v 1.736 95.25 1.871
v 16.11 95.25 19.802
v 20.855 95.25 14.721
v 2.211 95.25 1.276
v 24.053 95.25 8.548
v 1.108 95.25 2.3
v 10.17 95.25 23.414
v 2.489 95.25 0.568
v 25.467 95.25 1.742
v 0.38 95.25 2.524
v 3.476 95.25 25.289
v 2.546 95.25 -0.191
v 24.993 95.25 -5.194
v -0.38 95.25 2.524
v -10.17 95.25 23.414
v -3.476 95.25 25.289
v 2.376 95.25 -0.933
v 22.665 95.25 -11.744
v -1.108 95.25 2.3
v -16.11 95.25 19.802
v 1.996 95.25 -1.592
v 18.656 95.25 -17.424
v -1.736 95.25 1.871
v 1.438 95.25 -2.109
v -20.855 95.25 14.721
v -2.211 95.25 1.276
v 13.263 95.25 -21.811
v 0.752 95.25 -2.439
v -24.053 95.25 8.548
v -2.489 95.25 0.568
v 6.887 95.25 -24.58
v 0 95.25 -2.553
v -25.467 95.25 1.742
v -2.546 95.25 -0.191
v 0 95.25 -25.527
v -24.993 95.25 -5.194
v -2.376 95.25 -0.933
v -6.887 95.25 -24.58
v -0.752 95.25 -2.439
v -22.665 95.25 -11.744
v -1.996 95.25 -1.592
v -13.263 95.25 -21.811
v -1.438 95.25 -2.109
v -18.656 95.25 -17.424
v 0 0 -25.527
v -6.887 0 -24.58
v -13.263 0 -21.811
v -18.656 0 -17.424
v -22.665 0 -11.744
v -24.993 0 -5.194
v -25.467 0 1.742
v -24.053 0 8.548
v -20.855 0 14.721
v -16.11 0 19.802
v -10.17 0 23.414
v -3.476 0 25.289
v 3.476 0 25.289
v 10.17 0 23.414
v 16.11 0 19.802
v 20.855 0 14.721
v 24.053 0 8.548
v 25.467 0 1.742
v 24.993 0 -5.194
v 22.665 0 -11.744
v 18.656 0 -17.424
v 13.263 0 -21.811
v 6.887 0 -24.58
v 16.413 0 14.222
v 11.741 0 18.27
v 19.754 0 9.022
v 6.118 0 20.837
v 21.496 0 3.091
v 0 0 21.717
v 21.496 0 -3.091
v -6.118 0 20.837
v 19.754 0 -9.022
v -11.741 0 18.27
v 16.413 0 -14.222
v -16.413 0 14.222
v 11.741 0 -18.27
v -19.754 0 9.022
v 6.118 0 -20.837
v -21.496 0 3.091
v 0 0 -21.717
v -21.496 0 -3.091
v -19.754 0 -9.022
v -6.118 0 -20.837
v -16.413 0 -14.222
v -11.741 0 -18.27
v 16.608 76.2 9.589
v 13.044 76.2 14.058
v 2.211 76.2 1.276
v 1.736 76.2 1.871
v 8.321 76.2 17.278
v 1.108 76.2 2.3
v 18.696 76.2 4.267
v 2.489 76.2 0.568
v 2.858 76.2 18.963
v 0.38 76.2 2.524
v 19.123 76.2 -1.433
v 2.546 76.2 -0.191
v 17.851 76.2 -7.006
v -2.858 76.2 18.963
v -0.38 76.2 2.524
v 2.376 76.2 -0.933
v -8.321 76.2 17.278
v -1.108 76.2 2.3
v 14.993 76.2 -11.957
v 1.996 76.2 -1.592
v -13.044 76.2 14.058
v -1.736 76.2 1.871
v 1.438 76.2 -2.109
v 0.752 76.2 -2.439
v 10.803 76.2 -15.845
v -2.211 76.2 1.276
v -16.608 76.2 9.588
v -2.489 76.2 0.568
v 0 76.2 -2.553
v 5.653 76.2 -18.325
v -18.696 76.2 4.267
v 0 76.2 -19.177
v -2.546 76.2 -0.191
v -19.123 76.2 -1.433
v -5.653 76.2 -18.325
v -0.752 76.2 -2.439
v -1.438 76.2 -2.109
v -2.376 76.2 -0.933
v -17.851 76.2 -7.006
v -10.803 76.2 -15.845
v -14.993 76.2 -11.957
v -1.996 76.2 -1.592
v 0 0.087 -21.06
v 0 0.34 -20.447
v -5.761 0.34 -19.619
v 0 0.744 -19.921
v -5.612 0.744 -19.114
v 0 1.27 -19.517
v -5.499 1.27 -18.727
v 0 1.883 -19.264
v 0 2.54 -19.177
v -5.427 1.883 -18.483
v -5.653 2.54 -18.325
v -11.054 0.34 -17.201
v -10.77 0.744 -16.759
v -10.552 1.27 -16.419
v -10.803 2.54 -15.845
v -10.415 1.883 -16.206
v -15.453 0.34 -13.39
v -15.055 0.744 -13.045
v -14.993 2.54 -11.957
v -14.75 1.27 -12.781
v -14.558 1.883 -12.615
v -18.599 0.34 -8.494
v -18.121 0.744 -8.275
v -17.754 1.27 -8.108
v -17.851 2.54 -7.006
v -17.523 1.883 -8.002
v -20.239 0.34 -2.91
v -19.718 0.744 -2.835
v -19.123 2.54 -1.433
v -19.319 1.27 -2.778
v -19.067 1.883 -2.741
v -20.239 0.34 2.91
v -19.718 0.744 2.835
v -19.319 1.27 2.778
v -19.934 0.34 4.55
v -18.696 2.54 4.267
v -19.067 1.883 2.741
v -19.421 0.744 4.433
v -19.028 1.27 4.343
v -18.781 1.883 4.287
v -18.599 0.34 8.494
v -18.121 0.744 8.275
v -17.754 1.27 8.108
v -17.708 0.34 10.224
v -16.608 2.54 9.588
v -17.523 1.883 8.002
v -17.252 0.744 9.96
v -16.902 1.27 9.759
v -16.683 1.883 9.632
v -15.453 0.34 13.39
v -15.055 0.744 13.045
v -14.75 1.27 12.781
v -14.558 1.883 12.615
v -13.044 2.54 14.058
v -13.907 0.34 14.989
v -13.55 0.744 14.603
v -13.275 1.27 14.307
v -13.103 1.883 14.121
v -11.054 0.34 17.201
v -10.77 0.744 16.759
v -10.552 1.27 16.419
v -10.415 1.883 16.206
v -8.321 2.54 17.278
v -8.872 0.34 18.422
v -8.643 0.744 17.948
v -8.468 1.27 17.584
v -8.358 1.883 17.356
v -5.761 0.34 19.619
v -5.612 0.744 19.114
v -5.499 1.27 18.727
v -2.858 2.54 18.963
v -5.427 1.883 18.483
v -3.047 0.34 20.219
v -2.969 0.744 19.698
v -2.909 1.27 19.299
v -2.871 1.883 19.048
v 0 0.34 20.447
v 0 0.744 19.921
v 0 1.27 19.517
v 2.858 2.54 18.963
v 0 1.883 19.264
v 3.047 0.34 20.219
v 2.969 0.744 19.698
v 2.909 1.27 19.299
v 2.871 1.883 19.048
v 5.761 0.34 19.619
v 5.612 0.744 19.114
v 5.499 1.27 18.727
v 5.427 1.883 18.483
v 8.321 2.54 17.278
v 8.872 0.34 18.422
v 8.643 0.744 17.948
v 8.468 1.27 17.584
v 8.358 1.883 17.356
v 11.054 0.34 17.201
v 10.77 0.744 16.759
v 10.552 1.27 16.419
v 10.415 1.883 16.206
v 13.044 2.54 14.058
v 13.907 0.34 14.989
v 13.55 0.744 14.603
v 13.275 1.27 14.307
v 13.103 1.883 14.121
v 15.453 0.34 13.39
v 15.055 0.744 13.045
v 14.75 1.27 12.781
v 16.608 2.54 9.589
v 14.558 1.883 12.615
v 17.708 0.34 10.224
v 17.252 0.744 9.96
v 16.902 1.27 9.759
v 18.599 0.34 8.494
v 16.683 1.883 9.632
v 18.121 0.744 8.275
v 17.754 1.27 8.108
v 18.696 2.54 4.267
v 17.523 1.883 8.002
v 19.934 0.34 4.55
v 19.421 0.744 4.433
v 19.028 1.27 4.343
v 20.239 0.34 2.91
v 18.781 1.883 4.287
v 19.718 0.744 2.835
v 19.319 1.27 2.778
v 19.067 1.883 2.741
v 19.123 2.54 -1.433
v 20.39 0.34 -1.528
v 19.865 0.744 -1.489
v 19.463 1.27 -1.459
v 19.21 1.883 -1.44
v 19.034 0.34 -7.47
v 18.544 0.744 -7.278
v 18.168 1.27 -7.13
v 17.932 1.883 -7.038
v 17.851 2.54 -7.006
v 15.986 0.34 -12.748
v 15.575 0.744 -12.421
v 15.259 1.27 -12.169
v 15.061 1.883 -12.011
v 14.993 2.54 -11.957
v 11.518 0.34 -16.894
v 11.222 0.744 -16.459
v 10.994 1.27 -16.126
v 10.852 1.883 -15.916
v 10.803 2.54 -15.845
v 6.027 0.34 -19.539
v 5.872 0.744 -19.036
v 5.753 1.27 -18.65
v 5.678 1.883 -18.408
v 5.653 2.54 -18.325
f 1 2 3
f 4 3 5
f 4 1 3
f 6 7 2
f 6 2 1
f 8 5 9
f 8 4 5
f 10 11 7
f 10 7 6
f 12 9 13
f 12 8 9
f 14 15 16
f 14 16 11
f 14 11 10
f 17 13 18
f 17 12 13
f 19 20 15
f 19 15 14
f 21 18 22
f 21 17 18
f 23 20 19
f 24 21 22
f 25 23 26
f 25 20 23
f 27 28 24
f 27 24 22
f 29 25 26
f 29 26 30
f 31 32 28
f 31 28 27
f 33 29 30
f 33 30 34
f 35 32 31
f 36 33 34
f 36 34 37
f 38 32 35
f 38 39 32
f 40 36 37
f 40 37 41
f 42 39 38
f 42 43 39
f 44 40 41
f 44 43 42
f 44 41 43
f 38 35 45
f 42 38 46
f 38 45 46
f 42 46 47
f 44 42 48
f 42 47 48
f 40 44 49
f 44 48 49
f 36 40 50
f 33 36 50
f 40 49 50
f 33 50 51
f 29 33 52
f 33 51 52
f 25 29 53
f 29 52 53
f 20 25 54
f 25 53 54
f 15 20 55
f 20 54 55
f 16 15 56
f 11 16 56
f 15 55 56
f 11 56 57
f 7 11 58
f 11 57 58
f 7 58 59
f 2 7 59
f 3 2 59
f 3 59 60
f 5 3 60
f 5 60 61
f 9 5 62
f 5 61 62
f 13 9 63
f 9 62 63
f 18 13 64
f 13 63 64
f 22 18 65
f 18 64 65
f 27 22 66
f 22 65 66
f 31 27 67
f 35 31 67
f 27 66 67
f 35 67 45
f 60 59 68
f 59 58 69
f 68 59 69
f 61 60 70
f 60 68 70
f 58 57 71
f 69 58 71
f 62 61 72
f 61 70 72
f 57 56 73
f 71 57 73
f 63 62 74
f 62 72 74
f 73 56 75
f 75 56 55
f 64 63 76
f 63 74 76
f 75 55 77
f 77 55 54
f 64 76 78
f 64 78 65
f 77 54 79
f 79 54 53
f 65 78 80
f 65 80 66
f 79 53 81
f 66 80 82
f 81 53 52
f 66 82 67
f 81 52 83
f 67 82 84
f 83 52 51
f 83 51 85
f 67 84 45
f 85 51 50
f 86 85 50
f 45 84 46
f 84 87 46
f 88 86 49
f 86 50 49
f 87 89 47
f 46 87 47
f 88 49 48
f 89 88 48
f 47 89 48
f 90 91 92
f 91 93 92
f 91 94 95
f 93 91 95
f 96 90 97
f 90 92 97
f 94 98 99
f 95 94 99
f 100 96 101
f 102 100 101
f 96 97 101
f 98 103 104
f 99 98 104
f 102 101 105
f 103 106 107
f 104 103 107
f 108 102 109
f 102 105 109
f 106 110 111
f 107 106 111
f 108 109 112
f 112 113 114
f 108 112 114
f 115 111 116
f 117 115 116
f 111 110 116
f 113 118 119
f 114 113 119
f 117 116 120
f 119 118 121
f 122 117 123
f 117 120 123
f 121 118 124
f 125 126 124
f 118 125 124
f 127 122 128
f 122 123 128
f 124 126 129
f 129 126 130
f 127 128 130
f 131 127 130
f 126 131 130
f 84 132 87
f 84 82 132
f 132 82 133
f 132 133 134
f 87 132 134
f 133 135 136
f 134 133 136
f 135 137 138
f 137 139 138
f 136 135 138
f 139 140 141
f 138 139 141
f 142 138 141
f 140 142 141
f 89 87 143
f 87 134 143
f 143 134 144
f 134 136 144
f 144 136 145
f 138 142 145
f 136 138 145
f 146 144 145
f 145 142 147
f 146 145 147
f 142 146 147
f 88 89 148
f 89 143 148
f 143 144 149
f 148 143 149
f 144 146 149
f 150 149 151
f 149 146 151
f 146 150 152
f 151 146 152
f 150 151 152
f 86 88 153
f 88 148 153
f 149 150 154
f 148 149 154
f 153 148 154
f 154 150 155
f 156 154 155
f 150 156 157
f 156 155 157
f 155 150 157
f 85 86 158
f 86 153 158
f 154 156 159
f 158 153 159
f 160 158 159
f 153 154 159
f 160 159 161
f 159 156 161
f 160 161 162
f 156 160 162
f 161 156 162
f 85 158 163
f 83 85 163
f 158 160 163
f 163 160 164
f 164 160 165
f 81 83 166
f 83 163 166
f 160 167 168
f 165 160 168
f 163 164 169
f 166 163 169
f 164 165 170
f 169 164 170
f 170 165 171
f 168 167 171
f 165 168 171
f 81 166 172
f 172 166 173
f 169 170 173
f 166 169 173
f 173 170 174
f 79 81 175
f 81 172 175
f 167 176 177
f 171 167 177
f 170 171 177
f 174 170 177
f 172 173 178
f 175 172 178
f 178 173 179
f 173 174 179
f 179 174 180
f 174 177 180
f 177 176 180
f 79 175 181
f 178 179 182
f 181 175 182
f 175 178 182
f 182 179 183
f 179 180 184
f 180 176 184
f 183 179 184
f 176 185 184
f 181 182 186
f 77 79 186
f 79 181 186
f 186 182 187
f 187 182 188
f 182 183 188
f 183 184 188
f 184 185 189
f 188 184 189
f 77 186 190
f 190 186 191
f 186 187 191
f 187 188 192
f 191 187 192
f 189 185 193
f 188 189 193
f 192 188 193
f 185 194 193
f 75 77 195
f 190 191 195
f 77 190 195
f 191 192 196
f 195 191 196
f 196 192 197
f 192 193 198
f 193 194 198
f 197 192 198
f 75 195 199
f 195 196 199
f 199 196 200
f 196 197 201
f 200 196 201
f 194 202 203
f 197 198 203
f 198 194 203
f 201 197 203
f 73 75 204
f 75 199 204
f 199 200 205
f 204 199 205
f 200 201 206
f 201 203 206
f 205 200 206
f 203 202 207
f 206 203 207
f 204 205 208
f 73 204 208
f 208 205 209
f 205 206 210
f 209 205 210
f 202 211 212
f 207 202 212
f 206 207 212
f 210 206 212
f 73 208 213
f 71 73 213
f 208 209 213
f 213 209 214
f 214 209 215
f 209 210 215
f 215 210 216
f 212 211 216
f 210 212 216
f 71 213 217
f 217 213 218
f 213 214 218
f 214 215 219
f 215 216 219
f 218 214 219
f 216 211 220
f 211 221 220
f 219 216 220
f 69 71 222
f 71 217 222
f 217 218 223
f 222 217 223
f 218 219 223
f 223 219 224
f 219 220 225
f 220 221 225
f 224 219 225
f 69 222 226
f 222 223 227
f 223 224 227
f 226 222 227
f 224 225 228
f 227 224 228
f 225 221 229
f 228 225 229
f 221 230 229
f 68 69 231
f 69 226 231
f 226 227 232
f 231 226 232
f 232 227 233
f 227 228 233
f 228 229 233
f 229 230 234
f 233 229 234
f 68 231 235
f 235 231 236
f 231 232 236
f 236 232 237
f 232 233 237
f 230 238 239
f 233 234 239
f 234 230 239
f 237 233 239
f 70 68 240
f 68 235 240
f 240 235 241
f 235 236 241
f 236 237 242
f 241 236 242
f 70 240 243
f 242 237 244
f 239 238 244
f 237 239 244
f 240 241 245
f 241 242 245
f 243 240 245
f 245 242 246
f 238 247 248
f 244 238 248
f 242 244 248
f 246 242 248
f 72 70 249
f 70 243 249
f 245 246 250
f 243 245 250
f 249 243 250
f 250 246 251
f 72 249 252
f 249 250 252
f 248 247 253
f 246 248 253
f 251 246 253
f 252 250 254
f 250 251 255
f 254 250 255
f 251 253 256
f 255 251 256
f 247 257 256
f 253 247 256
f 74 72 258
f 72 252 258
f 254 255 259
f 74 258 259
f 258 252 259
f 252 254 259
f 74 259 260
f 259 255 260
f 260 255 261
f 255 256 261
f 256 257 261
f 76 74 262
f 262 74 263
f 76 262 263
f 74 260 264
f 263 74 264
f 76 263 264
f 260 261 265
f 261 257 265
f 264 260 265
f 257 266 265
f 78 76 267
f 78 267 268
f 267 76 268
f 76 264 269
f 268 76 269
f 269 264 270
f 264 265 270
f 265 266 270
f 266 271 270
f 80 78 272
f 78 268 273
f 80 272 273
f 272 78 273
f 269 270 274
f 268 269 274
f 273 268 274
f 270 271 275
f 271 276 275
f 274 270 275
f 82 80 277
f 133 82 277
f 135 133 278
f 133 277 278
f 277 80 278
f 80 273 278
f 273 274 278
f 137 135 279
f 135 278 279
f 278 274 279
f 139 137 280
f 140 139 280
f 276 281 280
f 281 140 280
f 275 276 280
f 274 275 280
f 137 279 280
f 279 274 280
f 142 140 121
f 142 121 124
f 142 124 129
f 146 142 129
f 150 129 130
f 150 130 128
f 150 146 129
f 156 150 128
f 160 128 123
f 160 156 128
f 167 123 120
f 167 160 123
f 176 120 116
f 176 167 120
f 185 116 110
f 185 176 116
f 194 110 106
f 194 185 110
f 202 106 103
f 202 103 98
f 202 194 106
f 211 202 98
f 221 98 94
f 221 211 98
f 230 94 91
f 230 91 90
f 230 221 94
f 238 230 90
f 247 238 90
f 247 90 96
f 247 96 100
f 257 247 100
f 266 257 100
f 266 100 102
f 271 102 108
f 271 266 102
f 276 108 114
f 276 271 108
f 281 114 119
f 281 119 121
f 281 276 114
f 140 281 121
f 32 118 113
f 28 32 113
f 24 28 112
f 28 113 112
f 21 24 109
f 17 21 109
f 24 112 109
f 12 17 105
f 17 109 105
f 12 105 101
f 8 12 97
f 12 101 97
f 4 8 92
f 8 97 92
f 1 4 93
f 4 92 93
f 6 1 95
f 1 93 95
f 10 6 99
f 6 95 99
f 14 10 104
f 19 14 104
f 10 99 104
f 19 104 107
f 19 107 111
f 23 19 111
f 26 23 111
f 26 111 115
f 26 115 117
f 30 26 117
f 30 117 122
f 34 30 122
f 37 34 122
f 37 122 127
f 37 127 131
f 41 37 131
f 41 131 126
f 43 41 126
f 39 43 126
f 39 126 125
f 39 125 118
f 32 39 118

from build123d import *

# Parameters (mm, degrees)
SKETCH1_R                   = 25.527
SKETCH1_R_2                 = 19.177
BOSS_EXTRUDE1_DEPTH         = 76.2
SKETCH2_R                   = 25.527
BOSS_EXTRUDE2_DEPTH         = 19.05
TAP_DRILL_FOR_1_4_20_TAP1_D = 5.1054
FILLET1_R                   = 2.54


with BuildPart() as part:
    # Sketch1 → Boss-Extrude1 (new body)
    with BuildSketch(Plane(origin=(0, 0, 0), x_dir=(1, 0, 0), z_dir=(0, 1, 0))):
        with Locations(Location((0, 0, 0), (0, 0, 90))):
            Circle(SKETCH1_R)
        with Locations(Location((0, 0, 0), (0, 0, 90))):
            Circle(SKETCH1_R_2, mode=Mode.SUBTRACT)
    extrude(amount=BOSS_EXTRUDE1_DEPTH)

    # Sketch2 → Boss-Extrude2 (add)
    with BuildSketch(Plane(origin=(0, 76.2, 0), x_dir=(1, 0, 0), z_dir=(0, 1, 0))):
        with Locations(Location((0, 0, 0), (0, 0, 90))):
            Circle(SKETCH2_R)
    extrude(amount=BOSS_EXTRUDE2_DEPTH)

    # Tap Drill for 1/4-20 Tap1 (through all)
    with Locations(Plane.ZX.offset(95.25)):
        with Locations((0, 0)):
            Hole(TAP_DRILL_FOR_1_4_20_TAP1_D / 2)

    # Fillet1
    fillet1_edges = [part.edges().sort_by_distance(p)[0] for p in [
        (0, 0, 19.177),
    ]]
    fillet(fillet1_edges, radius=FILLET1_R)


solid = part.part
